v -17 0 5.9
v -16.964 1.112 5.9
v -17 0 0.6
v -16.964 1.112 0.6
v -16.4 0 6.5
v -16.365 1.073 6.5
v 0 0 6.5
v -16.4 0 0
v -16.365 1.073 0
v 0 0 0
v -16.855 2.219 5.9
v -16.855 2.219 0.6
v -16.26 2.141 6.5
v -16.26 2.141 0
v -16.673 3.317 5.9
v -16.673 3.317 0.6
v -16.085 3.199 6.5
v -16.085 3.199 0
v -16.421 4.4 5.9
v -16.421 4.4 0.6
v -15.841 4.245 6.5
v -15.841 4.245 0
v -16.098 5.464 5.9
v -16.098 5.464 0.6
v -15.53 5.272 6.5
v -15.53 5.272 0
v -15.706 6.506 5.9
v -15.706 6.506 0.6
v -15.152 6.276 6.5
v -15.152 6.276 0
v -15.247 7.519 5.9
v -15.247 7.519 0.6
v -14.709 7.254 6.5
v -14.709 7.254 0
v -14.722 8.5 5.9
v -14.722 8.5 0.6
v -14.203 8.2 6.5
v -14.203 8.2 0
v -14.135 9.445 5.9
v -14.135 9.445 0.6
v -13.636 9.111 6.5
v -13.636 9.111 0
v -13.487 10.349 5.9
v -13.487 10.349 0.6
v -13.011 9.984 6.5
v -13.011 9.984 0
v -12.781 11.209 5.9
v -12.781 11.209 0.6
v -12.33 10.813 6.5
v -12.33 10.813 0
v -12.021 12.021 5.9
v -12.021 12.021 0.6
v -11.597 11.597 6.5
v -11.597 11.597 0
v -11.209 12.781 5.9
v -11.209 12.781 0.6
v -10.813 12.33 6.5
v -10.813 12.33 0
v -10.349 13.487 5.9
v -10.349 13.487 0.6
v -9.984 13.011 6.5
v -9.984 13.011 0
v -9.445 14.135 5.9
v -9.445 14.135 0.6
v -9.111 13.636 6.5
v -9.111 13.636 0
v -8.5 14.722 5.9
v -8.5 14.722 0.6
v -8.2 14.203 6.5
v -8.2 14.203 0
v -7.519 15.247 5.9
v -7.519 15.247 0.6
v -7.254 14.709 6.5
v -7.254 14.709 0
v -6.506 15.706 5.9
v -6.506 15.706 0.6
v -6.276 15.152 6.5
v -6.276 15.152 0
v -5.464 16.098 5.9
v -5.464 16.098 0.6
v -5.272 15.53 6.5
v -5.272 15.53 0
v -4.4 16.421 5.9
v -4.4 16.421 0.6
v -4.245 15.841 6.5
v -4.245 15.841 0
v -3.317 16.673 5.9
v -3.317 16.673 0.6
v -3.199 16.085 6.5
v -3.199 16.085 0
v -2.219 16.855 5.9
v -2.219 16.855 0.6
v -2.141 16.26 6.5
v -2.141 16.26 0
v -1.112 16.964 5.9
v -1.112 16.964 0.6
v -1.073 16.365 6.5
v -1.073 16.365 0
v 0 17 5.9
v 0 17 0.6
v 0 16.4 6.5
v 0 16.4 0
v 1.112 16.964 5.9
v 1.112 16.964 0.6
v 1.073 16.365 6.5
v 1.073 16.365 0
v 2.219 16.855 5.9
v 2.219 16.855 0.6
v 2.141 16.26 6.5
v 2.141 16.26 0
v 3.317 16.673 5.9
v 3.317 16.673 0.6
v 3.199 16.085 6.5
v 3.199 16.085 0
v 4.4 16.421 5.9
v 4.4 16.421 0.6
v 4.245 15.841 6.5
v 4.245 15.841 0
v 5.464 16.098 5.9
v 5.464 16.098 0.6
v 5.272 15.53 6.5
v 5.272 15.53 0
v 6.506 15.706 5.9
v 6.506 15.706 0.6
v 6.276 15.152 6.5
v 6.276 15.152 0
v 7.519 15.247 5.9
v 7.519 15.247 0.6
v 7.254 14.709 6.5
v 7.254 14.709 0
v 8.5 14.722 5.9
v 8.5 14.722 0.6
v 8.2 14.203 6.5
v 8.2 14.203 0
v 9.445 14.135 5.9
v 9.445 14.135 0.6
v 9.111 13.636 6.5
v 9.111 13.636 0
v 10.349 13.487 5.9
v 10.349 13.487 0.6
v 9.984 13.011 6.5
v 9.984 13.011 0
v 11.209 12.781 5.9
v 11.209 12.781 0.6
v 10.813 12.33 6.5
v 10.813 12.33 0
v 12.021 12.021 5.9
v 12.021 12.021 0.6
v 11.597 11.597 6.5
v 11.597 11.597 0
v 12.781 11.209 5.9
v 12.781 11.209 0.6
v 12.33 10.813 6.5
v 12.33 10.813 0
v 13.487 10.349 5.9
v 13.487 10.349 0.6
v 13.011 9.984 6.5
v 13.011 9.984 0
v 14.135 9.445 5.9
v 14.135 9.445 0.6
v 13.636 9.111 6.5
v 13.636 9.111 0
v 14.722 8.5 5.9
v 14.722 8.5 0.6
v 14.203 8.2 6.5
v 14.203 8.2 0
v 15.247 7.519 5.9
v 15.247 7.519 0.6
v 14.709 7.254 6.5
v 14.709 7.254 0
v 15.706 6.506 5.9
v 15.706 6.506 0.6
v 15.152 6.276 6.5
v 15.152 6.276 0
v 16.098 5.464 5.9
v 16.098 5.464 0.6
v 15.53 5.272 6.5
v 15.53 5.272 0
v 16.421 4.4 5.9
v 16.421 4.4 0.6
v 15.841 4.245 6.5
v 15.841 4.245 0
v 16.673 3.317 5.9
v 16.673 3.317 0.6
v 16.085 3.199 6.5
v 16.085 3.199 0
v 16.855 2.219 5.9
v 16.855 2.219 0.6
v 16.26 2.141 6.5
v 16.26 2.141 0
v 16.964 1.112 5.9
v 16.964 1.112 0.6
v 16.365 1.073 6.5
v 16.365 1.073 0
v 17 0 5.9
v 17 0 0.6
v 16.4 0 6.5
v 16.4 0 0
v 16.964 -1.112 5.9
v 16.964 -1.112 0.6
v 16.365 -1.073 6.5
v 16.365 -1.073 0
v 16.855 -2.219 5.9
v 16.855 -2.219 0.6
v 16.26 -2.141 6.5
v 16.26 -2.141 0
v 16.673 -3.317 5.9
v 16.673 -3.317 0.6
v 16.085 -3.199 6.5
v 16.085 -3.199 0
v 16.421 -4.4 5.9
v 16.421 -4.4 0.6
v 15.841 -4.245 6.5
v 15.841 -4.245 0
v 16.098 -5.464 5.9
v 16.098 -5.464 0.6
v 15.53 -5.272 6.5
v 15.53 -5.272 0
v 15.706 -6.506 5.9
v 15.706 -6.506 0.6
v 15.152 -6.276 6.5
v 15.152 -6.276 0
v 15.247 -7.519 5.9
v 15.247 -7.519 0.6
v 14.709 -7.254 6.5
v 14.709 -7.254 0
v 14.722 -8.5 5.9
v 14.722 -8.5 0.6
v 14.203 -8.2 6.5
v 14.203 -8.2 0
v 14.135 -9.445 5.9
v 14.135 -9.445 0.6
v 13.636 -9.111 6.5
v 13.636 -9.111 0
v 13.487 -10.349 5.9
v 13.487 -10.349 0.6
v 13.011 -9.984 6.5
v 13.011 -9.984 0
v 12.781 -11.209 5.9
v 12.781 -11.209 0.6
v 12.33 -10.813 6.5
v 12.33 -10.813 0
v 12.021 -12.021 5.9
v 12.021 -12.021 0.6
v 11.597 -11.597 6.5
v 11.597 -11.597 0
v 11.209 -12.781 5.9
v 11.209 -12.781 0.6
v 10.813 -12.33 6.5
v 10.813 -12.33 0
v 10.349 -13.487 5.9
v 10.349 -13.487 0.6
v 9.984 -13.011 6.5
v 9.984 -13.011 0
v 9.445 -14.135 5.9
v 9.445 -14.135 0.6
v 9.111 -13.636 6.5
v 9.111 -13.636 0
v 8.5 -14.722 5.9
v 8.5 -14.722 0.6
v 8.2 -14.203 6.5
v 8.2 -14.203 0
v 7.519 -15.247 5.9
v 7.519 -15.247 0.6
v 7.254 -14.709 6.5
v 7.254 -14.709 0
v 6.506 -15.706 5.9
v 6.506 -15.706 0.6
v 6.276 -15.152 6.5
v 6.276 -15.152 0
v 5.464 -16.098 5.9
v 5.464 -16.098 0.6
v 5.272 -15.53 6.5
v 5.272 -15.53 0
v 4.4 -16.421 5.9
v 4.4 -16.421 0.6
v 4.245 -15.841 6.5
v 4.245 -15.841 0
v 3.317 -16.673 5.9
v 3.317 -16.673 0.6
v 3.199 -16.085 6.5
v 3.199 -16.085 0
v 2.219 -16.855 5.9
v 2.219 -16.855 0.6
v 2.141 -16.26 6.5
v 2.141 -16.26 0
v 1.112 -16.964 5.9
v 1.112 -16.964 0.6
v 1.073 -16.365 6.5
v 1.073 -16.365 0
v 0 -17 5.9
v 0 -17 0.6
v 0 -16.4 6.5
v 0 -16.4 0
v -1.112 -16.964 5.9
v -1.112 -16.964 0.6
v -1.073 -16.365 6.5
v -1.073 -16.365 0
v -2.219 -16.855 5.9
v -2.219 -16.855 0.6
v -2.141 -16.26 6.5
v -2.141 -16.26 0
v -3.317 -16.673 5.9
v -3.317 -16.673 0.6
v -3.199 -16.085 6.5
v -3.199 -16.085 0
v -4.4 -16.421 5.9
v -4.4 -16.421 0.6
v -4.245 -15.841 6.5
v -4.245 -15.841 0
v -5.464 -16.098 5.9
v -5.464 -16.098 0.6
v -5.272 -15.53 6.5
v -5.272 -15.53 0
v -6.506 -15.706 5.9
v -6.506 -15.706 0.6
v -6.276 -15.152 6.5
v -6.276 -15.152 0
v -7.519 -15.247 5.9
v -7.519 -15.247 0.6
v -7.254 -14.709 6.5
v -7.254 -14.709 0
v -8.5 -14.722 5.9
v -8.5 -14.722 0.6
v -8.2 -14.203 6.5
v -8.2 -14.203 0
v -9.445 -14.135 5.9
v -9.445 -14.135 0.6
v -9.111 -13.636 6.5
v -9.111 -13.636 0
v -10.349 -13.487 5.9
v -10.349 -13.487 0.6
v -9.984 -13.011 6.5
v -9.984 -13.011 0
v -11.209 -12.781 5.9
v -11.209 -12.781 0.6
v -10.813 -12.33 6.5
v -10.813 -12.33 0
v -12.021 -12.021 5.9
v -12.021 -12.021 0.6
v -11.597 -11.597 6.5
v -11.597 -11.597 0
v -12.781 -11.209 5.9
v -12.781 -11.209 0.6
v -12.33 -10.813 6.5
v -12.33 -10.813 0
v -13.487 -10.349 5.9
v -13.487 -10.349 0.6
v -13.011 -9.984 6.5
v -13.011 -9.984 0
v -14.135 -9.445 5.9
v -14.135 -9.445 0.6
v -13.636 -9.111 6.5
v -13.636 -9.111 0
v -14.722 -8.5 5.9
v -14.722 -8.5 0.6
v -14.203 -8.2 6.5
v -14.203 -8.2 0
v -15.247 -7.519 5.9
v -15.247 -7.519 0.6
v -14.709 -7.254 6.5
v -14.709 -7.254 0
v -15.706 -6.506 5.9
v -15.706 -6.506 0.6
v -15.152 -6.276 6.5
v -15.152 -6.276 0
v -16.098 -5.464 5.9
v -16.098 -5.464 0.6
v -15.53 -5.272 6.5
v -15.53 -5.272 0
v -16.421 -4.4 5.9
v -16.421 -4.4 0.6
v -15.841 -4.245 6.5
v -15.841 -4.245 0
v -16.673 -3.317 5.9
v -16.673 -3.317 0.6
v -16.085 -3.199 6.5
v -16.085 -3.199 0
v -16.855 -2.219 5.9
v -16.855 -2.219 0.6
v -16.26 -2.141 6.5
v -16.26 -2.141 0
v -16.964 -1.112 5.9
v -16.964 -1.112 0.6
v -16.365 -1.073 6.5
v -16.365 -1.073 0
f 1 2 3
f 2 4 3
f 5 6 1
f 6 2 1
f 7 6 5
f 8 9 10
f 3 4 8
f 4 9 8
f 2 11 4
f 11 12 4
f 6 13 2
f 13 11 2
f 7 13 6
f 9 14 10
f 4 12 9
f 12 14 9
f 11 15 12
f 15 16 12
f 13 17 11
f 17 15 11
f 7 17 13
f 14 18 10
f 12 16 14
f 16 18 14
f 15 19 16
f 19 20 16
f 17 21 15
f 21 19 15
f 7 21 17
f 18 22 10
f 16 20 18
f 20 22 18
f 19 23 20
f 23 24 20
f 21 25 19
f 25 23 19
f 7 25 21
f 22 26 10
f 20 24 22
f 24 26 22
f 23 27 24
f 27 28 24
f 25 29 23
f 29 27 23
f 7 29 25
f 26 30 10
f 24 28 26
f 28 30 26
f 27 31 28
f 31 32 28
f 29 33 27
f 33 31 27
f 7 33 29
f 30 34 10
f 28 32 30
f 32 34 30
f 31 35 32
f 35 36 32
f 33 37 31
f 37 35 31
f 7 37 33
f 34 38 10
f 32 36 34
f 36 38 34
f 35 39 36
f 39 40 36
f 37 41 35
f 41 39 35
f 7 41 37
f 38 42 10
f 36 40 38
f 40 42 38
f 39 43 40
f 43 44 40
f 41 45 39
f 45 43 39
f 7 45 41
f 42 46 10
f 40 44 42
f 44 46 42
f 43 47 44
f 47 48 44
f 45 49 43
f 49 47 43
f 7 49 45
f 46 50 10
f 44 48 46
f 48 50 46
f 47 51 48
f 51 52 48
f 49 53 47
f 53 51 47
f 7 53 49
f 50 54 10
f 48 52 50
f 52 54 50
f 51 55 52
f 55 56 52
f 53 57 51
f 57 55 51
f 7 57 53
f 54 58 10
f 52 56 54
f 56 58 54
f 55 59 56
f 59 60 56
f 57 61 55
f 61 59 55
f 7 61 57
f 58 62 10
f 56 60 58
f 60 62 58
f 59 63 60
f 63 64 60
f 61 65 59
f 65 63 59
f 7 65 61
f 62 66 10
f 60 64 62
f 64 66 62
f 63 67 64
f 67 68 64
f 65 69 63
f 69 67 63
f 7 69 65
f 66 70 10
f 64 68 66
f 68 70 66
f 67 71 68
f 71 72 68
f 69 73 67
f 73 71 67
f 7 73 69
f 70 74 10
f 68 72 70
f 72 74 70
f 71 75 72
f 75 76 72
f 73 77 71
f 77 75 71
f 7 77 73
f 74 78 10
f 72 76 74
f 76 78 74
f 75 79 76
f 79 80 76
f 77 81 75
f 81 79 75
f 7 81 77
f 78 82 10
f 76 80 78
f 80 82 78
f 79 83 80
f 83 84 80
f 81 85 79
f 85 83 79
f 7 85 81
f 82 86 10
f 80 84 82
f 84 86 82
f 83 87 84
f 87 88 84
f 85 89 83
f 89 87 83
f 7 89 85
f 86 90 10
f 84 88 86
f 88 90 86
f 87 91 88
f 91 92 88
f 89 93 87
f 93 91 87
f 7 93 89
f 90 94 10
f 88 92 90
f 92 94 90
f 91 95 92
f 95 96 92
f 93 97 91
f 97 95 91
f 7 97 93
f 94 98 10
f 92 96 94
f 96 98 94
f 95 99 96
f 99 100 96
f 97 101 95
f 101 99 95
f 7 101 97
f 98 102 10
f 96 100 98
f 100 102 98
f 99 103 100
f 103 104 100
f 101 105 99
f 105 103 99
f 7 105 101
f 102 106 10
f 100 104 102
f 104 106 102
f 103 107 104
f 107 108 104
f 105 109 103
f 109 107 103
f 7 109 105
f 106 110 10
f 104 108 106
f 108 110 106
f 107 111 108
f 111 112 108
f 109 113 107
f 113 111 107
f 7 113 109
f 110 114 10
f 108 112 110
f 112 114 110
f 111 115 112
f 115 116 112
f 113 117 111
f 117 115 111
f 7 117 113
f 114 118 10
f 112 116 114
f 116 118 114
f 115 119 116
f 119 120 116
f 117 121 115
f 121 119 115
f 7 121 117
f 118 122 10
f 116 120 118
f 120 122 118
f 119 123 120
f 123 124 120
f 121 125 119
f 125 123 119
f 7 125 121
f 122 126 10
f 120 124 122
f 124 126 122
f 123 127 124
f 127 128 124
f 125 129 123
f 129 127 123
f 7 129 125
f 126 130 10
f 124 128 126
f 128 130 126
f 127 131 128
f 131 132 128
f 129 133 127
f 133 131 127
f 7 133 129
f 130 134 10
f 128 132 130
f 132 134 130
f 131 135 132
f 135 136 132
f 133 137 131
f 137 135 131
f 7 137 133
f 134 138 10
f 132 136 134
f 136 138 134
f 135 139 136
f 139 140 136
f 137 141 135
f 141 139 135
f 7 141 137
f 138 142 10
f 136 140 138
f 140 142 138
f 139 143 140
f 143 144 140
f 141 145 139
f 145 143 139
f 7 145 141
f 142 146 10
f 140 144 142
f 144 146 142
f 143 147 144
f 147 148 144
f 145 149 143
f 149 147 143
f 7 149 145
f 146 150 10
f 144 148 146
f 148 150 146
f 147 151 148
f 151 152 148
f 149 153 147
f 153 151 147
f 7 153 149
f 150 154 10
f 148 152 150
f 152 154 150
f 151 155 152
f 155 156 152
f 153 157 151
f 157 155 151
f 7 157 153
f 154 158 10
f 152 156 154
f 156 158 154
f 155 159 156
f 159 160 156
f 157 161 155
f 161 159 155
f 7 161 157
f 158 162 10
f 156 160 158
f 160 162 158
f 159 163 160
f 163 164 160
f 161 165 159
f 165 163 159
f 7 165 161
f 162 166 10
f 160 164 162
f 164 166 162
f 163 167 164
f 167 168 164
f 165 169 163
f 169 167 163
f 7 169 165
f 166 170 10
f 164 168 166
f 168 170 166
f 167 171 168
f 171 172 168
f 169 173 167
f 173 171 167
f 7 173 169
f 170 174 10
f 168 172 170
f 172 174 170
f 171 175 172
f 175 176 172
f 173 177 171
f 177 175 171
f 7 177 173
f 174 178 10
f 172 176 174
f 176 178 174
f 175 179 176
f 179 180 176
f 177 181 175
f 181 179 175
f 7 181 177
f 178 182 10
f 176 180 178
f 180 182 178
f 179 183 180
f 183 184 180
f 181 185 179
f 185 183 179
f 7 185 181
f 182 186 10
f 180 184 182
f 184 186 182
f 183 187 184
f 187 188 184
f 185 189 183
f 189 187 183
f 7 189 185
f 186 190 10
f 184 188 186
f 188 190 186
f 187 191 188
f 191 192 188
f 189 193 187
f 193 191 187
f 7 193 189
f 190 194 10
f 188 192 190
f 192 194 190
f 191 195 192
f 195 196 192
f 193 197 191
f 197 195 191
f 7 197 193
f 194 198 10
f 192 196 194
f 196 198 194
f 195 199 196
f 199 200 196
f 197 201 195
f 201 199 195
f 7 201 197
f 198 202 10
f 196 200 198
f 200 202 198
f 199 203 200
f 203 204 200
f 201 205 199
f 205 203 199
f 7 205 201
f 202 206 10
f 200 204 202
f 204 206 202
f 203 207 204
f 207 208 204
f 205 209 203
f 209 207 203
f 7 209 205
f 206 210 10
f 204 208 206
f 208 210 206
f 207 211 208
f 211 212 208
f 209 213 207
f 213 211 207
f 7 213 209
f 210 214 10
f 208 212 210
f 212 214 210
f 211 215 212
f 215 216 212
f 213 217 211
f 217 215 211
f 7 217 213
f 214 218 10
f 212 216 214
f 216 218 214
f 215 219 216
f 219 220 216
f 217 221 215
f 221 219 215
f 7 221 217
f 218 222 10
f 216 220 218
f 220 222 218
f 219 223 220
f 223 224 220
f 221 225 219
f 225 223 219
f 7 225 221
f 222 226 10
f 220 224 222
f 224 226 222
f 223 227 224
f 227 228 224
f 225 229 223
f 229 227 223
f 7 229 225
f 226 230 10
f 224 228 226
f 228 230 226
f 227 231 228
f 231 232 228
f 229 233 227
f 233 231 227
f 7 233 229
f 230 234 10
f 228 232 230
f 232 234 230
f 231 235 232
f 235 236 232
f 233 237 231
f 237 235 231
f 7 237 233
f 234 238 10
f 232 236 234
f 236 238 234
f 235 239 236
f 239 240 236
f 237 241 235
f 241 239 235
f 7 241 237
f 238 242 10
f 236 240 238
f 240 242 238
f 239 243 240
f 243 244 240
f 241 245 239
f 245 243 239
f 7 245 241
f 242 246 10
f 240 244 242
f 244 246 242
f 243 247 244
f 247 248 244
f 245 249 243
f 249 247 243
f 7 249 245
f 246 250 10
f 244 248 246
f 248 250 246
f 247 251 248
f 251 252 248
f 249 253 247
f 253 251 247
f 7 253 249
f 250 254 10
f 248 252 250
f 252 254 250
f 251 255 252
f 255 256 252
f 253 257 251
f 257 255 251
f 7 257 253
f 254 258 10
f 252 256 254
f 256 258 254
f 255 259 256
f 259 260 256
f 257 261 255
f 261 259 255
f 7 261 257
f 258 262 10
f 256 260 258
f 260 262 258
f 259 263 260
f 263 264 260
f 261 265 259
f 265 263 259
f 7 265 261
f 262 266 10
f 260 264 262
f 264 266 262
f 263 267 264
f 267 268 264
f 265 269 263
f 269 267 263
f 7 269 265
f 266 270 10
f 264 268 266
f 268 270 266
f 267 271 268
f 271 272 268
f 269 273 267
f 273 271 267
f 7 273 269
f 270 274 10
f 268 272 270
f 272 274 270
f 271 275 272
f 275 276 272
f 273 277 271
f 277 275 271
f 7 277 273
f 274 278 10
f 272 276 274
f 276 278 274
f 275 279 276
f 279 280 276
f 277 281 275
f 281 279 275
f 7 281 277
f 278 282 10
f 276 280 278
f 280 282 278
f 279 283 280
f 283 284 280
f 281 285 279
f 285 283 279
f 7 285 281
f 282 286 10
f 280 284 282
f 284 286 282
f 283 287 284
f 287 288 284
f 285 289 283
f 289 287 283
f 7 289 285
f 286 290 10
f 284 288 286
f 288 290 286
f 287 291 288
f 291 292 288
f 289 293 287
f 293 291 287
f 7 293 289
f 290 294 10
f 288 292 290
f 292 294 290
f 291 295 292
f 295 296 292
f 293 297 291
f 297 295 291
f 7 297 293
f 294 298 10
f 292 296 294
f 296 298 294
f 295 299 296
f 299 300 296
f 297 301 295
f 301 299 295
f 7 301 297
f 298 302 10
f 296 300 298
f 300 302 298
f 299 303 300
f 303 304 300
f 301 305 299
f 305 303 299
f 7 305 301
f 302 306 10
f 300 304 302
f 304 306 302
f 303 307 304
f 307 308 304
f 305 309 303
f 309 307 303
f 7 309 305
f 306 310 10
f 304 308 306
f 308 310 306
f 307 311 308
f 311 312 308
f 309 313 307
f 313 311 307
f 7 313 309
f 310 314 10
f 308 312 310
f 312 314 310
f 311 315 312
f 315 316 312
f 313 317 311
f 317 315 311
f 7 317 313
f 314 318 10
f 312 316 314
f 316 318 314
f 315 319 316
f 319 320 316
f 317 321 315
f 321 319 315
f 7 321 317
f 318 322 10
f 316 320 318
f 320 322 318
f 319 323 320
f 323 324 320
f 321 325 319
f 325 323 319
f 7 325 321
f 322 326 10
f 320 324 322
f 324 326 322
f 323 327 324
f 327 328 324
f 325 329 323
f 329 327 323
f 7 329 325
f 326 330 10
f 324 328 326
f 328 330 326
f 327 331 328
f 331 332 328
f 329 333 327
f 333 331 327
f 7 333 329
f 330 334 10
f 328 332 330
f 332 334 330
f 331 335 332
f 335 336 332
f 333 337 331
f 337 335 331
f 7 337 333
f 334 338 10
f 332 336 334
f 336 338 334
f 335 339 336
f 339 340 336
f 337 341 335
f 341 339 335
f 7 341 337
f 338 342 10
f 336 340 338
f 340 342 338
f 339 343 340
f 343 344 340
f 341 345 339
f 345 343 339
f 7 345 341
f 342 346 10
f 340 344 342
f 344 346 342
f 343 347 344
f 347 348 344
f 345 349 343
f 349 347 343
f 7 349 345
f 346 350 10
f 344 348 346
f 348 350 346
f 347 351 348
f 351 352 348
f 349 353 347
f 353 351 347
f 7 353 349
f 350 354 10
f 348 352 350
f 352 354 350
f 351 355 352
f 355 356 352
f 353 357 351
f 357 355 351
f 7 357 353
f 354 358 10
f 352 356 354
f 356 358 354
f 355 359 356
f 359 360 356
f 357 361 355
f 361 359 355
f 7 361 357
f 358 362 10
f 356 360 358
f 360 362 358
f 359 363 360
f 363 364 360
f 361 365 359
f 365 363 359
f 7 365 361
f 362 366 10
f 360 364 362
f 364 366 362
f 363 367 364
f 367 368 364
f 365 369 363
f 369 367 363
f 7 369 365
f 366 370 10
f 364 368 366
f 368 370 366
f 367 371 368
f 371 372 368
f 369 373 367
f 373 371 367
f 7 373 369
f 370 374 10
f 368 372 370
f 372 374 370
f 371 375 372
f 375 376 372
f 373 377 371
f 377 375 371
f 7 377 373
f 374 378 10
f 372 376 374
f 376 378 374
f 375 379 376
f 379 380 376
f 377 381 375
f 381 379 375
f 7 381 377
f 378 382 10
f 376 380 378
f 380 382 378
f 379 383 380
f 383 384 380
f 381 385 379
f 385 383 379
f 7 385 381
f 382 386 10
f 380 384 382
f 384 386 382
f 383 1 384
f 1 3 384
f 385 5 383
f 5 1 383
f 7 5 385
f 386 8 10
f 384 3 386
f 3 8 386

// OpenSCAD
// file: dimensions.scad
// dimensions.scad - the Connect Four parts' dimensions, in mm (angles in degrees).
// Each value is the one of ros2_ws/src/so101_connect4/config/connect4_grid.yaml (in m and rad there), which
// the simulation is built from; a name is the YAML path, its keys joined by "_".
// tools/ci/check_scad_dimensions.py fails when one differs: change the YAML first, then this file.

grid_columns = 7;
grid_rows = 6;
grid_column_pitch = 37;
grid_row_pitch = 34;
grid_slot_gap = 9.5;
grid_slot_entry_height = 250;
grid_depth_guide_height = 30;
grid_depth_guide_opening = 30;
grid_headroom = 2;
grid_wall = 2.2;
grid_plate = 3;
grid_window_diameter = 29;
grid_frame_margin = 45;

markers_size = 30;
markers_plate = 39;

placement_riser = 100;

token_diameter = 34;
token_thickness = 6.5;

dispenser_rails = 3;
dispenser_tokens_per_rail = 7;
dispenser_slope = 25;
dispenser_slot_gap = 9.5;
dispenser_wall = 2;
dispenser_floor = 3;
dispenser_station_wall_height = 7;
dispenser_rail_wall_height = 30;
dispenser_stop_width = 2;
dispenser_stop_offset = -0.45;
dispenser_rail_pitch = 40;
dispenser_station_step = 40;
dispenser_markers_span = [90, 165];
dispenser_markers_size = 30;
dispenser_markers_plate = 39;
dispenser_markers_aside = 35;
dispenser_markers_below = 20;
dispenser_placement_station_z = 20;
// main file
// token.scad - a Connect Four token (docs/project/phase2/P2-02 §7): 21 in each of the two colors.
// Print flat, no support. The grid's slots leave it 0.8 mm along a column and 3 mm across: print one, then
// drop it through one column of the grid before printing the 41 others.
include <dimensions.scad>

chamfer = 0.6;  // on both edges: the token slides on the rails and into the depth guide
$fn = 96;

module token() {
  r = token_diameter / 2;
  rotate_extrude()
    polygon([[0, 0], [r - chamfer, 0], [r, chamfer], [r, token_thickness - chamfer],
             [r - chamfer, token_thickness], [0, token_thickness]]);
}

token();
